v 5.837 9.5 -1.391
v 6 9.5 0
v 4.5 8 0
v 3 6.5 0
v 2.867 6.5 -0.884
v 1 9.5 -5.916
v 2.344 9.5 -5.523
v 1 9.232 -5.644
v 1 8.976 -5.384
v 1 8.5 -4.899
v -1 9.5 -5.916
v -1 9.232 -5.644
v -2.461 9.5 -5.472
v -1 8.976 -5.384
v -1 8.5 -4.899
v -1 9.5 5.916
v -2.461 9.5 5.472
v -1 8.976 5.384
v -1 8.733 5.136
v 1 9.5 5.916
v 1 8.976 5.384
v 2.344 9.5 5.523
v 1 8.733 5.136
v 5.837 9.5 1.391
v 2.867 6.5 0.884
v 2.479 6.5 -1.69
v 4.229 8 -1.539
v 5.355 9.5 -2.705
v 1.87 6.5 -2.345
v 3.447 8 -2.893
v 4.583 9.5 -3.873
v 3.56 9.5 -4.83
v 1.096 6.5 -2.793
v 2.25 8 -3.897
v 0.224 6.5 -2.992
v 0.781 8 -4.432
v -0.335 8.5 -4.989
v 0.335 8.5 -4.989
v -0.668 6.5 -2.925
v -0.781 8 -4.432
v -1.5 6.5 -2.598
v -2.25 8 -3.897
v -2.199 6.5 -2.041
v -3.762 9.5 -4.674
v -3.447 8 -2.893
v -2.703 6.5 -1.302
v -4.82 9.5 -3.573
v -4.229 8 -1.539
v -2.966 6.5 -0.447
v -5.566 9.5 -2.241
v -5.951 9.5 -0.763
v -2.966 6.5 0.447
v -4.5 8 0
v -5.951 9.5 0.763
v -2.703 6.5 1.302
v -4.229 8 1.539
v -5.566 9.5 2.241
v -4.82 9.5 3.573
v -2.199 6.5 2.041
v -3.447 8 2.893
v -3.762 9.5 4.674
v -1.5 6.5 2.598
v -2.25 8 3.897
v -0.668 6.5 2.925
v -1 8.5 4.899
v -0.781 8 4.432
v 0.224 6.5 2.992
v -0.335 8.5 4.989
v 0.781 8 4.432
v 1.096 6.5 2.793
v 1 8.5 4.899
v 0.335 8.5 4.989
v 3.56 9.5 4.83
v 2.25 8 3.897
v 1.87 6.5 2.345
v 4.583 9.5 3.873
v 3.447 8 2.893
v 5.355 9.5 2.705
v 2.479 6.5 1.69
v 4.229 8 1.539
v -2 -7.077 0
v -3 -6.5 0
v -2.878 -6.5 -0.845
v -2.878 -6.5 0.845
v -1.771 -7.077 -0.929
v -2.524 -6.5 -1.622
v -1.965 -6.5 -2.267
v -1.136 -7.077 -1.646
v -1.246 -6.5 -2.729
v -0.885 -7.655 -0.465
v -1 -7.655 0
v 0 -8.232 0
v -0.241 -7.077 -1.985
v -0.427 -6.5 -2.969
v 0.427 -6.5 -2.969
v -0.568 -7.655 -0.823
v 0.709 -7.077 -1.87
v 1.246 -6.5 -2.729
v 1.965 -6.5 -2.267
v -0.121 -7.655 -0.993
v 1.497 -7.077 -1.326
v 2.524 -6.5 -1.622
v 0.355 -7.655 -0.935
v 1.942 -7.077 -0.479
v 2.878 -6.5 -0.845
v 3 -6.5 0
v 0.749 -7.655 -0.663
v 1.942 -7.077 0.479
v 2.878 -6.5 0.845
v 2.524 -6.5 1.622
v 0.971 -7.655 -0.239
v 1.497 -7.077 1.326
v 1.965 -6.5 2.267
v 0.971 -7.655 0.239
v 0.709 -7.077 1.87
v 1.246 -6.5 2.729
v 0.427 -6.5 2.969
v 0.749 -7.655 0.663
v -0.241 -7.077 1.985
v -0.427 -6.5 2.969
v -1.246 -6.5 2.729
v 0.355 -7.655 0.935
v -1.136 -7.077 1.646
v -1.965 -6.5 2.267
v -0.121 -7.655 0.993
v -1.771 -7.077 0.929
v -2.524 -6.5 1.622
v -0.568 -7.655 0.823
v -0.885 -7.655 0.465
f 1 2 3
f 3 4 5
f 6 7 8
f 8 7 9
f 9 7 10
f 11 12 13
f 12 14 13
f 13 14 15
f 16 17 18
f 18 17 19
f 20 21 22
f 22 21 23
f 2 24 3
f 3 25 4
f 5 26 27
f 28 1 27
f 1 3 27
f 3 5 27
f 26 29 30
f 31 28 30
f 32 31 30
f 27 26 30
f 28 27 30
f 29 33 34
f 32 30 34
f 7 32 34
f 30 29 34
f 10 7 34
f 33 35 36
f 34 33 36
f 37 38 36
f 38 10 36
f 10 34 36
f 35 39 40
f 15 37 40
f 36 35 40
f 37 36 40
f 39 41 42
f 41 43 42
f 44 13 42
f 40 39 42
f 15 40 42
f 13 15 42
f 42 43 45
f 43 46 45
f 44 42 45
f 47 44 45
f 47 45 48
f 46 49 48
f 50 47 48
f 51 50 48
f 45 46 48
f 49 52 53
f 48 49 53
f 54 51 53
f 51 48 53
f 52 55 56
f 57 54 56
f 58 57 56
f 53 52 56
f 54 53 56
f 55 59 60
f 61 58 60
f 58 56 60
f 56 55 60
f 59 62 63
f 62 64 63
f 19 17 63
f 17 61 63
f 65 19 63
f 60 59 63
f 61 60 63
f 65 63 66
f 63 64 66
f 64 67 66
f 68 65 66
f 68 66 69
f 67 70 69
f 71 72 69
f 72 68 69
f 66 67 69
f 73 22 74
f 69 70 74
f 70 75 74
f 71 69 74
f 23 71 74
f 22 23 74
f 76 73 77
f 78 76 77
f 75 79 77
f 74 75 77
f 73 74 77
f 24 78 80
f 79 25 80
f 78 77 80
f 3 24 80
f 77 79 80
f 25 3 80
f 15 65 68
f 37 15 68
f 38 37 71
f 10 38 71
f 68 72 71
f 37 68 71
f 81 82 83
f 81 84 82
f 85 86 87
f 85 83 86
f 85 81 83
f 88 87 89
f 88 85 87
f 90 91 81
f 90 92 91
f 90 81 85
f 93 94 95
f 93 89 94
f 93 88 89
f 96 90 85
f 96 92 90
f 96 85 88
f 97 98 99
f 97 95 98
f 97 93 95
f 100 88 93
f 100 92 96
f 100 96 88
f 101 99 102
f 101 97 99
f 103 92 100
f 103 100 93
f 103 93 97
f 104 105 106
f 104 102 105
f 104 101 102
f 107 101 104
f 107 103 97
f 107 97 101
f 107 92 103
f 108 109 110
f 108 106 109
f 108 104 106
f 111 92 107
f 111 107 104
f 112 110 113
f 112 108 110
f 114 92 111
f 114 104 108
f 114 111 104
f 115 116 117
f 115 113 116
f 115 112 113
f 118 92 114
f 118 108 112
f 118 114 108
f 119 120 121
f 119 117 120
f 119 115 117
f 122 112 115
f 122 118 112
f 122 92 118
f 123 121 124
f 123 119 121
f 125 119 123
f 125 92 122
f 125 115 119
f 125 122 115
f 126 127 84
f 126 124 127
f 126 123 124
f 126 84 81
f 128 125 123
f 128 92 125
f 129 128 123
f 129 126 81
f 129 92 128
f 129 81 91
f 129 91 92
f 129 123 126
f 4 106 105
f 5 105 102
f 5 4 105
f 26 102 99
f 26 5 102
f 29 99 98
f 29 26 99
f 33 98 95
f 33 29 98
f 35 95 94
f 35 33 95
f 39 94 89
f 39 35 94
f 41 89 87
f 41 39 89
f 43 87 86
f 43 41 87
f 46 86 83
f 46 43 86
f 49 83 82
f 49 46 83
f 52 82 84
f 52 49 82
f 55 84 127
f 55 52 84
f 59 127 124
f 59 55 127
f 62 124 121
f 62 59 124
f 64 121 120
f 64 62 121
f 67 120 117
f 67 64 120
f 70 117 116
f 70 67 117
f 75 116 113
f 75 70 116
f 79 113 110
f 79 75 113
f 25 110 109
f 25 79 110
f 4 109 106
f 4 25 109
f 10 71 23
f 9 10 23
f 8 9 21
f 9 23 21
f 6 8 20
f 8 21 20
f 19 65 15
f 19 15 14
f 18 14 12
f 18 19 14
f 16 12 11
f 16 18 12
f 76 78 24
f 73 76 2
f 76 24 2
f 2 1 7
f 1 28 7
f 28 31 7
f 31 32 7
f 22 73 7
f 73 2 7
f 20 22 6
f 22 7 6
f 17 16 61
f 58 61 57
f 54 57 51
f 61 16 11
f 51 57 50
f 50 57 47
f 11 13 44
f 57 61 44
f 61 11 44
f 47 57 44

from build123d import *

# Parameters (mm, degrees)
SKETCH2_R           = 3
BOSS_EXTRUDE1_DEPTH = 6.5
SKETCH7_W           = 2
SKETCH7_H           = 1
CUT_EXTRUDE1_DEPTH  = 7


with BuildPart() as part:
    # Sketch2 → Boss-Extrude1 (new body, symmetric)
    with BuildSketch(Plane(origin=(0, 0, 0), x_dir=(1, 0, 0), z_dir=(0, 1, 0))):
        Circle(SKETCH2_R)
    extrude(amount=BOSS_EXTRUDE1_DEPTH, both=True)

    # Sketch5 → Revolve2 (revolve)
    with BuildSketch(Plane.XY):
        Polygon((-3, -6.5), (0, -8.232050808), (0, -6.5), align=None)
    revolve(axis=Axis((0, -6.5, 0), (0, -1, 0)))

    # Sketch6 → Revolve3 (revolve)
    with BuildSketch(Plane.XY):
        Polygon((3, 6.5), (0, 6.5), (0, 9.5), (6, 9.5), align=None)
    revolve(axis=Axis((0, 6.5, 0), (0, 1, 0)))

    # Sketch7 → Cut-Extrude1 (cut, symmetric)
    with BuildSketch(Plane.XY):
        with Locations((0, 9)):
            Rectangle(SKETCH7_W, SKETCH7_H)
    extrude(amount=CUT_EXTRUDE1_DEPTH, both=True, mode=Mode.SUBTRACT)


solid = part.part
